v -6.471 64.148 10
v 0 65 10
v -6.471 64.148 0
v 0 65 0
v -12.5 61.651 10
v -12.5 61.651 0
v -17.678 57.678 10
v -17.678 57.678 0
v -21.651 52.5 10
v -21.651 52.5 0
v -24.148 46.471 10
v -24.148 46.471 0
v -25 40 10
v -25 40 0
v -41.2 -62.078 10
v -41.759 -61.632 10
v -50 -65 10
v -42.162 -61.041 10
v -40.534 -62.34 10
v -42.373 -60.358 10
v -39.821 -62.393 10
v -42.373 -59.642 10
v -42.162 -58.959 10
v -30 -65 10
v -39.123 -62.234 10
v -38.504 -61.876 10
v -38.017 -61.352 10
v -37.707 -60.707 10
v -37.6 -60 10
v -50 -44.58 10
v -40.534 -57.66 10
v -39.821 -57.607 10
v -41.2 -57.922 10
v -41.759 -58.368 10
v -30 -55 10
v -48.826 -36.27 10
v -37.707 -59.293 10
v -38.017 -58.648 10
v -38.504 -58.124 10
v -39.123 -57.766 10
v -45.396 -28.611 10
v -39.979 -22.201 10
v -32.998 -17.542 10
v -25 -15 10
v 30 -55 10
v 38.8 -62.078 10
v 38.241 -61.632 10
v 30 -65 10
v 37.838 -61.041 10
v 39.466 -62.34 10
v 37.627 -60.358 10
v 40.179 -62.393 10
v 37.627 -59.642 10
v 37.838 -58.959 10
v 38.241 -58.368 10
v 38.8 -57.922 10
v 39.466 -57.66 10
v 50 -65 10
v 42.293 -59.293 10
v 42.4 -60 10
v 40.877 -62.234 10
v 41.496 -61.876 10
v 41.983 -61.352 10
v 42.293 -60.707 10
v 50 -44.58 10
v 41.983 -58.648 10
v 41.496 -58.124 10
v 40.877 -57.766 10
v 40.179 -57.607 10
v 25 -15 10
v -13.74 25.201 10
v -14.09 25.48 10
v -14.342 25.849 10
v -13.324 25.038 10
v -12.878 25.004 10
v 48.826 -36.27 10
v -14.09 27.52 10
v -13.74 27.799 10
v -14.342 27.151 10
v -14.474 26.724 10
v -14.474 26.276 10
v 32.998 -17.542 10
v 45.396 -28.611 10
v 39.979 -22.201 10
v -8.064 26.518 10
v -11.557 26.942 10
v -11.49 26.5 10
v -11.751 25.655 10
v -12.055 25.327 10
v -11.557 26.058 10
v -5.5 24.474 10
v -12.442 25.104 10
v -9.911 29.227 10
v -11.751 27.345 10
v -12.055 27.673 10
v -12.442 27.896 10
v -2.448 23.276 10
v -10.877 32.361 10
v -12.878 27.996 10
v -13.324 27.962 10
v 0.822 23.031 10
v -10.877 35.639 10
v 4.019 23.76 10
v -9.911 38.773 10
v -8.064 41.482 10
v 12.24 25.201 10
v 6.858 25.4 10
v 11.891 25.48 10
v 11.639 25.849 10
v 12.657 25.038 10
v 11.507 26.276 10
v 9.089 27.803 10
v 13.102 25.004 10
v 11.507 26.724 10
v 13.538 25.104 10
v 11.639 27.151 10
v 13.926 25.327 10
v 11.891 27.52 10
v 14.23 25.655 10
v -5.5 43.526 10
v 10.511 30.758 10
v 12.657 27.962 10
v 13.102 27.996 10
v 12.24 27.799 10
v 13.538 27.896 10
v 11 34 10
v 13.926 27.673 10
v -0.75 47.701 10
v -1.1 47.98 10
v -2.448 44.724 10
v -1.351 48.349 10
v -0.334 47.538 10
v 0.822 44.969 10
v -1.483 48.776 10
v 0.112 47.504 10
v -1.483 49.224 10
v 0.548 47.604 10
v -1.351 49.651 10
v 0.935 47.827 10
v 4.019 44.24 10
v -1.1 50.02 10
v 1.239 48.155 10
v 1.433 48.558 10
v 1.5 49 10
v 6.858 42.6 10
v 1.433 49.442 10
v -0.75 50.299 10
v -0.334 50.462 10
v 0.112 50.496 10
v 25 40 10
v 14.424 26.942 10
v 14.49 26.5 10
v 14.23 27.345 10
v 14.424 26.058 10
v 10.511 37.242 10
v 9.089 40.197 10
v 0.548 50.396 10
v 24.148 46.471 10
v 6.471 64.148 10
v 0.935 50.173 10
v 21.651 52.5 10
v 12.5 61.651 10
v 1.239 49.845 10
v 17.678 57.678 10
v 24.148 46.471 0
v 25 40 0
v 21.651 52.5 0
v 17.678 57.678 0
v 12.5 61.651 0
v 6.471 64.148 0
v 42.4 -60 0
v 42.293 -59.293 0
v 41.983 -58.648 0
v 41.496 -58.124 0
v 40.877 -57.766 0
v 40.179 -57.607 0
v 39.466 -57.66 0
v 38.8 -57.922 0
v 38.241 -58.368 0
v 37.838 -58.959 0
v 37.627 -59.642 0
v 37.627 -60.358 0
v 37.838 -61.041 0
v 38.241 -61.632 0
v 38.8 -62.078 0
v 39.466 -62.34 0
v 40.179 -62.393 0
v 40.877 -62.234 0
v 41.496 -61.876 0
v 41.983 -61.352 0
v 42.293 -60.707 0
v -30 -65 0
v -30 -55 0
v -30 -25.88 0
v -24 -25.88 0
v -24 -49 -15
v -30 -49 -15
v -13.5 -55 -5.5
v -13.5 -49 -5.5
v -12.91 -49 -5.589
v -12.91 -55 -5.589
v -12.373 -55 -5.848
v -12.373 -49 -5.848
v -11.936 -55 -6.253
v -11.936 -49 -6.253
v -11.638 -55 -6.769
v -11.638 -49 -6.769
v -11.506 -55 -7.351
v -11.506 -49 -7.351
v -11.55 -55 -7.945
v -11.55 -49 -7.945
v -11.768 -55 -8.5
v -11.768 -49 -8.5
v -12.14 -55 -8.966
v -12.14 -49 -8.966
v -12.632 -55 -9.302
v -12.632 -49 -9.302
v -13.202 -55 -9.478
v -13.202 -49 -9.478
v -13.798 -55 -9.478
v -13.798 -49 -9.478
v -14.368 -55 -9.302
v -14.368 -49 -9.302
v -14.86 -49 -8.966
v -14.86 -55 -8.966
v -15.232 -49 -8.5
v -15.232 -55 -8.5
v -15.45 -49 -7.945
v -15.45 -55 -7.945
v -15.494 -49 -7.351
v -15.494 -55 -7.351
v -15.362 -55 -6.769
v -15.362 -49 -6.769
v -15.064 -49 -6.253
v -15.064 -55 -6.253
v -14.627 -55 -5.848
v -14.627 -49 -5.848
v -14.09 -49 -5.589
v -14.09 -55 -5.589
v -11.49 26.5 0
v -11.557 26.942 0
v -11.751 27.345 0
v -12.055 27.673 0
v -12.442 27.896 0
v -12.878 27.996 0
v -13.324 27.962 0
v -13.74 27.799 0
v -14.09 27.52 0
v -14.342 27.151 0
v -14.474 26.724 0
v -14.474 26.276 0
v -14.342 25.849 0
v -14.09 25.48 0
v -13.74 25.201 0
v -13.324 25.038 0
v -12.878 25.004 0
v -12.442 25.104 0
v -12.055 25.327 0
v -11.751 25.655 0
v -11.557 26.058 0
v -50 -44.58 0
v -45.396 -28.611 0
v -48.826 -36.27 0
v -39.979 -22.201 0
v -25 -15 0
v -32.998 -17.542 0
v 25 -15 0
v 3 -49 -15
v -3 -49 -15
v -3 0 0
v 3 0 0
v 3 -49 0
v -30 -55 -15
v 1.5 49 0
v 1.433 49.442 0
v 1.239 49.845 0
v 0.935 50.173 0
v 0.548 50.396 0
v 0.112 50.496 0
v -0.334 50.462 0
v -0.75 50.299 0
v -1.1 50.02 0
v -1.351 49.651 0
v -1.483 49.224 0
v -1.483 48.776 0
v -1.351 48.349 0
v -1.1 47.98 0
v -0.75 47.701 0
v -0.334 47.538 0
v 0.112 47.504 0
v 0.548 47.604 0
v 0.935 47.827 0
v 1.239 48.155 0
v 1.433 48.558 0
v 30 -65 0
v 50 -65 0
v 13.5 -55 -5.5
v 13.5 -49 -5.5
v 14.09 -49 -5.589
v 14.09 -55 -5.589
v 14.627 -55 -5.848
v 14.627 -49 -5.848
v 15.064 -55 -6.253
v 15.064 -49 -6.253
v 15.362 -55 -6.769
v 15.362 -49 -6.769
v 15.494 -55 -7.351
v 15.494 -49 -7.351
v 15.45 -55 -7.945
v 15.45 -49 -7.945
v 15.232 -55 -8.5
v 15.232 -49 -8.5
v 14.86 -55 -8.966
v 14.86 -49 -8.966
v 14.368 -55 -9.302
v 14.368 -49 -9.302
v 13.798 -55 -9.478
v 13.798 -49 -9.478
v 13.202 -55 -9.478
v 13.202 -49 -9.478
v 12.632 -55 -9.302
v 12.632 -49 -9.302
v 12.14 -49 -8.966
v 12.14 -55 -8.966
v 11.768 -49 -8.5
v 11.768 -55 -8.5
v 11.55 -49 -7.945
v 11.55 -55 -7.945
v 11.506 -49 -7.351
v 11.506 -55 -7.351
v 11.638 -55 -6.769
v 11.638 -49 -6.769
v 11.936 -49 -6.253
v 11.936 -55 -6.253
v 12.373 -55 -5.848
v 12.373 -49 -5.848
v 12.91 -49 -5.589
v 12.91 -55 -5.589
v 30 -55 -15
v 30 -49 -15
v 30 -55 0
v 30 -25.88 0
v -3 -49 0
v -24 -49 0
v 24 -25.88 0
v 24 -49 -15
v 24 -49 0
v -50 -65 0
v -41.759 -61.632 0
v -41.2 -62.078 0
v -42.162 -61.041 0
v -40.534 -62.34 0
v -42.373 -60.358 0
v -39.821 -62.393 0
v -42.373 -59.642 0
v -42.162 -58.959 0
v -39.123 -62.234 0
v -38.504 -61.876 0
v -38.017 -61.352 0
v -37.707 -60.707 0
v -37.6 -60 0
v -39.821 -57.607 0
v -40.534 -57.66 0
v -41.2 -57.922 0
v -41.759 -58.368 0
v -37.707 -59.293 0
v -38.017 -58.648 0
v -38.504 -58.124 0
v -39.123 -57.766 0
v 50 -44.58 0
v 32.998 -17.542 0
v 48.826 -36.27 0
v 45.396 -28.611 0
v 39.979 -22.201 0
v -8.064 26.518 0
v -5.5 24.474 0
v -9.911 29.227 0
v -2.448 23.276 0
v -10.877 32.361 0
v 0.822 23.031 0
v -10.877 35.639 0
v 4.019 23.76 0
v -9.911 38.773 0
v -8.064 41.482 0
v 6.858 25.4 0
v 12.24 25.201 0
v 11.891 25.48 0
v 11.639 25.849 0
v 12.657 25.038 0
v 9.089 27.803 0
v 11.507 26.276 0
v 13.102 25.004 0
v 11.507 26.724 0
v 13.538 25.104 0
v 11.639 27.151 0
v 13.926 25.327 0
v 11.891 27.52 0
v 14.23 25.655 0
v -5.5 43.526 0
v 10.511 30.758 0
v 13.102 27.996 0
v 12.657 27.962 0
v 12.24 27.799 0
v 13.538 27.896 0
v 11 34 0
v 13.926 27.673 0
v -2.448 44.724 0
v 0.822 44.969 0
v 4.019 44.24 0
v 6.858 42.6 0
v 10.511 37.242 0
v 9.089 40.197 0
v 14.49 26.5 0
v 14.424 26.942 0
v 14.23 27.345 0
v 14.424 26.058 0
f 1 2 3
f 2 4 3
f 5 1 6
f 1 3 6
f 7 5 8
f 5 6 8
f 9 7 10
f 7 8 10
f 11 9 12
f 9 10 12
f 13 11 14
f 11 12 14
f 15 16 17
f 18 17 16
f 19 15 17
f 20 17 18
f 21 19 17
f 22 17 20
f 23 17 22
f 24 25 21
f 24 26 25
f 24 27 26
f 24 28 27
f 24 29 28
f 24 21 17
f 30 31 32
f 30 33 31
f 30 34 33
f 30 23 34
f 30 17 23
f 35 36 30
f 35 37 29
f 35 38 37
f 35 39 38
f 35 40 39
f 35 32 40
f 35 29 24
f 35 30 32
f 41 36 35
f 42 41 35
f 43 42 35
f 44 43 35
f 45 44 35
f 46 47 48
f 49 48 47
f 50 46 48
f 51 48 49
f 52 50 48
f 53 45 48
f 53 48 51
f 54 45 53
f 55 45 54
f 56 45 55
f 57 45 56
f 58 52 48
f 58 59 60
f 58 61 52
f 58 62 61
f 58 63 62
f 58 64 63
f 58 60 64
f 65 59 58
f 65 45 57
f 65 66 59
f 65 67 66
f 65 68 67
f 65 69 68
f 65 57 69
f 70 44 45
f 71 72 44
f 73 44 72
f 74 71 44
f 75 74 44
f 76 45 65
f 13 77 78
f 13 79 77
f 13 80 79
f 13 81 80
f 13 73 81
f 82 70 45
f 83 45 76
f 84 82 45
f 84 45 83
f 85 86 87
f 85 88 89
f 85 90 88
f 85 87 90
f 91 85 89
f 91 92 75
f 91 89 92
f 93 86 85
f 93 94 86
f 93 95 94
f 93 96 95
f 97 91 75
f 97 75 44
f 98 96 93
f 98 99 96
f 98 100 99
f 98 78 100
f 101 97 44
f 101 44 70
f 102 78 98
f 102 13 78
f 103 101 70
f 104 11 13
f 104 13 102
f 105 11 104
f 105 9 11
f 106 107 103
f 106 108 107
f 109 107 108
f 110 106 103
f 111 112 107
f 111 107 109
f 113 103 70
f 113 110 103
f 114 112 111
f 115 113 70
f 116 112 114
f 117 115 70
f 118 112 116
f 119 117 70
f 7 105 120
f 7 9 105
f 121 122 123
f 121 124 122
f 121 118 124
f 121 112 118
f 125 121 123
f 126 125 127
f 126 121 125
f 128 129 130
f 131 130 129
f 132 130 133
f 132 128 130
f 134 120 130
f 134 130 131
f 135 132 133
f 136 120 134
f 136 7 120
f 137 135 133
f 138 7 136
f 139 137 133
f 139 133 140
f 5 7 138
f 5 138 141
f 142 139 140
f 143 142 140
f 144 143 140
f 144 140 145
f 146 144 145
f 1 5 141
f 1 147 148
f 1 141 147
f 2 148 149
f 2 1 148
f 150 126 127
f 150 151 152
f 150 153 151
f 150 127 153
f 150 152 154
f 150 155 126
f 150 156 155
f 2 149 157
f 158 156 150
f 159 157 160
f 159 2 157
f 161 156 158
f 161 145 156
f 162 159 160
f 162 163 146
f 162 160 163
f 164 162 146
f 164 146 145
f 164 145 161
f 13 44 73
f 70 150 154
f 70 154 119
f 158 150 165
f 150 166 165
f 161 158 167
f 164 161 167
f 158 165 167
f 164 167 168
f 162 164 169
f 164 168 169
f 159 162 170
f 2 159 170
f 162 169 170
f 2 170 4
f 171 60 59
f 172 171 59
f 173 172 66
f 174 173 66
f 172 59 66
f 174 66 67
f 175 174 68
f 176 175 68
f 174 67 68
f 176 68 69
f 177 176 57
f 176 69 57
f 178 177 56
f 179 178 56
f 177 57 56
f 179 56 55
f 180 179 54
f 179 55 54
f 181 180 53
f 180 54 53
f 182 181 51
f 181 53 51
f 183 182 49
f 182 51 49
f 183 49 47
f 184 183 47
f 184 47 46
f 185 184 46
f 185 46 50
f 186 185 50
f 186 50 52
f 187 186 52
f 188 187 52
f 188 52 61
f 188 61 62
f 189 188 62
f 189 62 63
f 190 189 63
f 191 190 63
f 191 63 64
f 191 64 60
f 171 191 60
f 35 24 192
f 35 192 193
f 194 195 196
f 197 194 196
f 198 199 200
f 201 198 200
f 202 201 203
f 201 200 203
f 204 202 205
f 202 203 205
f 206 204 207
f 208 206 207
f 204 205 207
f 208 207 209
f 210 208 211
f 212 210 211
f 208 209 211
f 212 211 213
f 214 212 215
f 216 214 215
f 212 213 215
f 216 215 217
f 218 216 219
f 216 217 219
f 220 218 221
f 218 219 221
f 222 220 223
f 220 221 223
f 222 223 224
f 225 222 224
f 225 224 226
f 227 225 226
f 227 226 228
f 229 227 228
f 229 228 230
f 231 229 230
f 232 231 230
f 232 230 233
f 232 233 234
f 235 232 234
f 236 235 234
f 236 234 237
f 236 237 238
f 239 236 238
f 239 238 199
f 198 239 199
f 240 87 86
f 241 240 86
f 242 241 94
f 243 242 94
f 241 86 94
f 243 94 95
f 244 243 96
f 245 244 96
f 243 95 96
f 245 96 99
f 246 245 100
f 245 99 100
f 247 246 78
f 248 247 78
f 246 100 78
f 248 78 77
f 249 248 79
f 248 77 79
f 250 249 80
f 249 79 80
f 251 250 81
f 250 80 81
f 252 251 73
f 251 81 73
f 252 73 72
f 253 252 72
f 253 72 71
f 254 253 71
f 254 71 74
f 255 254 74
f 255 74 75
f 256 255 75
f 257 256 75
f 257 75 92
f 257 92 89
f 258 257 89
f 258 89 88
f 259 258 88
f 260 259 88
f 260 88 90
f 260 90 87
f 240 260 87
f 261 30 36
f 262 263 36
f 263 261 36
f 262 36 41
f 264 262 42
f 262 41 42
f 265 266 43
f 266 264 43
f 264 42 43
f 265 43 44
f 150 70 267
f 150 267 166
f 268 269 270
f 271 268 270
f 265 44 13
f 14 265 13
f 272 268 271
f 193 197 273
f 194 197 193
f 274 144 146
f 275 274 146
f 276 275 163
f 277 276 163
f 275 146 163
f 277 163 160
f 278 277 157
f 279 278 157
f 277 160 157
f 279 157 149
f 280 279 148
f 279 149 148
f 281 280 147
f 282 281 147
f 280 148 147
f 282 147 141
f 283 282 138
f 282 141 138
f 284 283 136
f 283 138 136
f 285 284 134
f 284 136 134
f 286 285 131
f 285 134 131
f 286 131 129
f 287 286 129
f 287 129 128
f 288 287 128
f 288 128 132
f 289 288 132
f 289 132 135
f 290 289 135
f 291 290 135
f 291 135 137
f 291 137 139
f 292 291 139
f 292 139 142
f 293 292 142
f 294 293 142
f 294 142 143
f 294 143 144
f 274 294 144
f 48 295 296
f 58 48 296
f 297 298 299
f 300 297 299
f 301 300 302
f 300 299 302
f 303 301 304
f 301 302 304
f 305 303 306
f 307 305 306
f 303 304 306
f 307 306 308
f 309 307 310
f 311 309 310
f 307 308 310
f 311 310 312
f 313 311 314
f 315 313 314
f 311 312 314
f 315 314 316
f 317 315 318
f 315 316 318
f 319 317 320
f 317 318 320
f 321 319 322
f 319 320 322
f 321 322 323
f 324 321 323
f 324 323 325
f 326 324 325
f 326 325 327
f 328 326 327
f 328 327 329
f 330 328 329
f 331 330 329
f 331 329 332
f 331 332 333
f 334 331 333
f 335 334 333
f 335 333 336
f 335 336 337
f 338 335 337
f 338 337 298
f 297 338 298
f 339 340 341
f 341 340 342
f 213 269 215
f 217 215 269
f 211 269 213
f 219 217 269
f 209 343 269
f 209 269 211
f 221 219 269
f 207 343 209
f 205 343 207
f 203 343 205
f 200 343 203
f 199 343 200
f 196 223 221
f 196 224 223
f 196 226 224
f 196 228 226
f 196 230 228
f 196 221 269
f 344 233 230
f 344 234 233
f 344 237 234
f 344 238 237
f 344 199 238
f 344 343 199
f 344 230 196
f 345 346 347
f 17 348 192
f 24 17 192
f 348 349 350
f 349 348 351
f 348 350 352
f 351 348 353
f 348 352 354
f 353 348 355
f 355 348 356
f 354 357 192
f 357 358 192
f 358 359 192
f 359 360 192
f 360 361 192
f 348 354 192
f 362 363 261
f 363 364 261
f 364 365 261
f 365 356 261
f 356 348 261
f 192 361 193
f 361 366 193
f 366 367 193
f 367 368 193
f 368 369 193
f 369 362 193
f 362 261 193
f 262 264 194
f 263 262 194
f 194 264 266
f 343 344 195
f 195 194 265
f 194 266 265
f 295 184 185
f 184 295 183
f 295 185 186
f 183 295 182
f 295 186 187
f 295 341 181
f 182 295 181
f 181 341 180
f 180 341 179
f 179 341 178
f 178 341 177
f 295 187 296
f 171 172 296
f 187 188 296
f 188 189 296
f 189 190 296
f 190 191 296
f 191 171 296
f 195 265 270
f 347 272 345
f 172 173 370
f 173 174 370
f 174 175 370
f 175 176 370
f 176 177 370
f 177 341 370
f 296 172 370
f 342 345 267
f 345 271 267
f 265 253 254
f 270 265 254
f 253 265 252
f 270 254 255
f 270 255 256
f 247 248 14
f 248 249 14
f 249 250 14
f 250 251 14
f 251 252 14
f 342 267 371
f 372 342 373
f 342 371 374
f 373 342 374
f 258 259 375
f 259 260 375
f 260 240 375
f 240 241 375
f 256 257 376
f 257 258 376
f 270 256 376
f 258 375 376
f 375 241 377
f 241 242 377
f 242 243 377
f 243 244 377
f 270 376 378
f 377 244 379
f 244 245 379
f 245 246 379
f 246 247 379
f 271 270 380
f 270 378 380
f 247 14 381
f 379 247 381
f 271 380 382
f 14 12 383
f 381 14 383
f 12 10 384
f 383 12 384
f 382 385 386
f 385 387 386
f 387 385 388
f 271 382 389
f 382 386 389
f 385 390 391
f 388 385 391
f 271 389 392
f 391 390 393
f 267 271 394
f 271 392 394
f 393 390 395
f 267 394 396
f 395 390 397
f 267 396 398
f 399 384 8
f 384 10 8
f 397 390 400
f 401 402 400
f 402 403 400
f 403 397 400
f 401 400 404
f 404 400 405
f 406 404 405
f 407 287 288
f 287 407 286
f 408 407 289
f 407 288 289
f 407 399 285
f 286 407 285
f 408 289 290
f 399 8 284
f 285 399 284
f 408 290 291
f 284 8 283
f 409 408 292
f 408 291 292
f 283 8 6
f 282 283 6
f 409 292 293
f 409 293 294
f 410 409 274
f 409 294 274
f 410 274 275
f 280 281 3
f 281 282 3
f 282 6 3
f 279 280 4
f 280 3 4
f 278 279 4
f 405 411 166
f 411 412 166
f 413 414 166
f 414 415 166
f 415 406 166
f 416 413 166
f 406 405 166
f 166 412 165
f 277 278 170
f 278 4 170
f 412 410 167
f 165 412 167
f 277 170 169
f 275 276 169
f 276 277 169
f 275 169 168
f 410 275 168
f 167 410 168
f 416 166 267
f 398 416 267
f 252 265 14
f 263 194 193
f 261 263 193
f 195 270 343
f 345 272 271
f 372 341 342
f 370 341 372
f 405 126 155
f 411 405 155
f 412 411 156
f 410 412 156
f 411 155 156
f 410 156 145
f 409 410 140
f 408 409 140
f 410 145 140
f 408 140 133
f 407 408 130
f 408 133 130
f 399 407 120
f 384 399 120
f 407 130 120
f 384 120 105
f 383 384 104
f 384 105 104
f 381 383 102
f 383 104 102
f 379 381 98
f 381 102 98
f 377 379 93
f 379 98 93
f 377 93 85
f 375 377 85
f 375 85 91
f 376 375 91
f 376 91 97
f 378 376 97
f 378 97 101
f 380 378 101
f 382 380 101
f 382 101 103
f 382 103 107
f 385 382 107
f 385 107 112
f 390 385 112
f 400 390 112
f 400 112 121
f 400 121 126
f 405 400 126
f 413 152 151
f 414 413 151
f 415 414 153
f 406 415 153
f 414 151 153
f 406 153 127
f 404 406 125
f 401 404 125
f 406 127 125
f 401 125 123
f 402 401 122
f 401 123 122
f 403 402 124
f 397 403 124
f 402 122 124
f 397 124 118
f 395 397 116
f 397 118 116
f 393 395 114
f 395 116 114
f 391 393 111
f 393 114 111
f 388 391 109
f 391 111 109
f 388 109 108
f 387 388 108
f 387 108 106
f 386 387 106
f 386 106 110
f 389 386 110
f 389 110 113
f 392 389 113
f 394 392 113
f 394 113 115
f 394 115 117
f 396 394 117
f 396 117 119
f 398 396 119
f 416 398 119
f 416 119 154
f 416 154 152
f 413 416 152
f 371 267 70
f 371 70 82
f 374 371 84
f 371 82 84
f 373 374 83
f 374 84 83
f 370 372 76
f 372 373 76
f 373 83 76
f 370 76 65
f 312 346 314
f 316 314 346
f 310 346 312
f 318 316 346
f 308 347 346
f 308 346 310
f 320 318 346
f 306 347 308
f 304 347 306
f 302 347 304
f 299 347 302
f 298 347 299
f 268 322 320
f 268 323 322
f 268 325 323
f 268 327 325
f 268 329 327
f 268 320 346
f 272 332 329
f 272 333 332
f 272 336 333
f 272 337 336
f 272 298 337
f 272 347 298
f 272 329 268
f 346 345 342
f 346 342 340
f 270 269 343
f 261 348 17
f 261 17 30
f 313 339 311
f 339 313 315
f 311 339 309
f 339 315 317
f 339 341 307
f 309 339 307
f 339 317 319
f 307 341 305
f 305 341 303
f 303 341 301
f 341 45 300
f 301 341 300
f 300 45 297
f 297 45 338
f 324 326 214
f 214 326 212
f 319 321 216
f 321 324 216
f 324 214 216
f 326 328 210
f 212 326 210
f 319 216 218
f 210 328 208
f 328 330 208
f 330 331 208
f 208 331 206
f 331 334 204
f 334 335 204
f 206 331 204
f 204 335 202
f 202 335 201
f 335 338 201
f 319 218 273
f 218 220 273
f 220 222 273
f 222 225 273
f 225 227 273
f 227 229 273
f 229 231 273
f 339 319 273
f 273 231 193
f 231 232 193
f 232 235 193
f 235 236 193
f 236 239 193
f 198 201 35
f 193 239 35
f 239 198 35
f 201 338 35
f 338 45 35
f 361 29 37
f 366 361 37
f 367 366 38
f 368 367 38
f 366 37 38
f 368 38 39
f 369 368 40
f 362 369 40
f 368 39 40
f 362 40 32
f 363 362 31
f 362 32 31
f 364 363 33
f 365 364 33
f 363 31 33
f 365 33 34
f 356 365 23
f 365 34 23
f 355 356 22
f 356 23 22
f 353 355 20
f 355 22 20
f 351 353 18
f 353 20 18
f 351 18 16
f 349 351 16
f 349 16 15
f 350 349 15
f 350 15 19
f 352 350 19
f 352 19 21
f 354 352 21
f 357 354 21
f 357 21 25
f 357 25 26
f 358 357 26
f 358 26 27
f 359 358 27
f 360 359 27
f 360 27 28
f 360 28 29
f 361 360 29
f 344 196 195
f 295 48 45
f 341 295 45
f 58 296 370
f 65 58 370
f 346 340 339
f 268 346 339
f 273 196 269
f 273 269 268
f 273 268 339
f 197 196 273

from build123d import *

# Parameters (mm, degrees)
SKETCH2_W           = 100
SKETCH2_H           = 130
BOSS_EXTRUDE1_DEPTH = 10
SKETCH4_W           = 60
SKETCH4_H           = 10
SKETCH4_W_2         = 25
SKETCH4_H_2         = 80
CUT_EXTRUDE1_DEPTH  = 55
SKETCH6_W           = 60
SKETCH6_H           = 6
BOSS_EXTRUDE2_DEPTH = 15
SKETCH10_R          = 2.4
CUT_EXTRUDE3_DEPTH  = 15
FILLET6_R           = 30
FILLET7_R           = 30
RIB9_REACH          = 85.367
SKETCH12_WALL_W     = 219.977831906
SKETCH12_WALL_H     = 6
RIB10_START         = -6
RIB10_DEPTH         = 6
SKETCH14_R          = 2
CUT_EXTRUDE4_DEPTH  = 15
FILLET8_R           = 25
SKETCH15_R          = 11
CUT_EXTRUDE5_DEPTH  = 15
SKETCH17_R          = 1.5
CUT_EXTRUDE6_DEPTH  = 15


# Read off the part's stored shape, not the designer's step: Rib10
# Some blends are built 0.0001 mm under size
with BuildPart() as part:
    # Sketch2 → Boss-Extrude1 (new body)
    with BuildSketch(Plane.XY):
        Rectangle(SKETCH2_W, SKETCH2_H)
    extrude(amount=BOSS_EXTRUDE1_DEPTH)

    # Sketch4 → Cut-Extrude1 (cut)
    with BuildSketch(Plane.XY.offset(10)):
        with Locations((0, -60)):
            Rectangle(SKETCH4_W, SKETCH4_H)
        with Locations((-37.5, 25)):
            Rectangle(SKETCH4_W_2, SKETCH4_H_2)
        with Locations((37.5, 25)):
            Rectangle(SKETCH4_W_2, SKETCH4_H_2)
    extrude(amount=-CUT_EXTRUDE1_DEPTH, mode=Mode.SUBTRACT)

    # Sketch6 → Boss-Extrude2 (add)
    with BuildSketch(Plane(origin=(0, 0, 0), x_dir=(-1, 0, 0), z_dir=(0, 0, -1))):
        with Locations((0, -52)):
            Rectangle(SKETCH6_W, SKETCH6_H)
    extrude(amount=BOSS_EXTRUDE2_DEPTH)

    # Sketch10 → Cut-Extrude3 (cut)
    with BuildSketch(Plane.XY.offset(10)):
        with Locations((-40, -60)):
            Circle(SKETCH10_R)
        with Locations((40, -60)):
            Circle(SKETCH10_R)
    extrude(amount=-CUT_EXTRUDE3_DEPTH, mode=Mode.SUBTRACT)

    # Fillet6
    # the kernel refuses this fillet: 30 mm, written as the material it takes off along each edge
    with BuildSketch(Plane(origin=(50, -15, 83.950997289), x_dir=(-1, 0, 0), z_dir=(0, 0, -1))) as fillet6_piece_1:
        with BuildLine():
            CenterArc((30, -29.580398915), FILLET6_R, 99.594068227, 80.405931773)
            Line((0, -29.580398916), (-0.6, -29.580398916))
            Line((-0.6, -29.580398916), (-0.6, 0))
            Line((-0.6, 0), (0, 0.6))
            ThreePointArc((0, 0.6), (12.5, 0.6), (24.9, 0.591607978))
            Line((24.9, 0.591607978), (25, 0))
        make_face()
    extrude(amount=157.901994578, mode=Mode.SUBTRACT)

    # Fillet7
    # the kernel refuses this fillet: 30 mm, written as the material it takes off along each edge
    with BuildSketch(Plane(origin=(-50, -15, 83.950997289), x_dir=(0, -1, 0), z_dir=(0, 0, -1))) as fillet7_piece_1:
        with BuildLine():
            CenterArc((29.580398916, -30), FILLET7_R, 90, 80.405931773)
            Line((0, -25), (-0.591607978, -24.9))
            ThreePointArc((-0.591607978, -24.9), (-0.6, -12.5), (-0.6, 0))
            Line((-0.6, 0), (0, 0.6))
            Line((0, 0.6), (29.580398916, 0.6))
            Line((29.580398916, 0.6), (29.580398916, 0))
        make_face()
    extrude(amount=157.901994578, mode=Mode.SUBTRACT)

    # Sketch12 wall → Rib9 (add, up to next)
    with BuildSketch(Plane(origin=(0, -24.5, -7.5), x_dir=(0, 0.956199955507, 0.292714272094), z_dir=(0, -0.292714272094, 0.956199955507)), mode=Mode.PRIVATE) as rib9_sk1:
        Rectangle(SKETCH12_WALL_W, SKETCH12_WALL_H)
    rib9_tool1 = extrude(rib9_sk1.sketch, amount=RIB9_REACH, mode=Mode.PRIVATE) - part.part
    add(rib9_tool1.solids().sort_by_distance((0, -24.5, -7.5))[0])

    # Rib10 outline → Rib10 (add)
    with BuildSketch(Plane.ZY.offset(30).offset(RIB10_START)):
        Polygon((0, -25.879609738), (-15, -49), (0, -49), align=None)
    rib10 = extrude(amount=RIB10_DEPTH)

    # Mirror4: Rib10 across plane
    add(rib10.mirror(Plane(origin=(0, 0, 0), x_dir=(0, 0, 1), z_dir=(1, 0, 0))))

    # Sketch14 → Cut-Extrude4 (cut)
    with BuildSketch(Plane(origin=(0, -49, 0), x_dir=(1, 0, 0), z_dir=(0, 1, 0))):
        with Locations(Location((-13.5, 7.5, 0), (0, 0, 270))):
            Circle(SKETCH14_R)
        with Locations(Location((13.5, 7.5, 0), (0, 0, 270))):
            Circle(SKETCH14_R)
    extrude(amount=-CUT_EXTRUDE4_DEPTH, mode=Mode.SUBTRACT)

    # Fillet8
    fillet8_edges = [part.edges().sort_by_distance(p)[0] for p in [
        (25, 65, 5),
        (-25, 65, 5),
    ]]
    fillet(fillet8_edges, radius=FILLET8_R - 0.0001)  # a hair under: the kernel refuses the full size

    # Sketch15 → Cut-Extrude5 (cut)
    with BuildSketch(Plane.XY.offset(10)):
        with Locations((0, 34)):
            Circle(SKETCH15_R)
    extrude(amount=-CUT_EXTRUDE5_DEPTH, mode=Mode.SUBTRACT)

    # Sketch17 → Cut-Extrude6 (cut)
    with BuildSketch(Plane.XY.offset(10)):
        with Locations((0, 49)):
            Circle(SKETCH17_R)
        with Locations((12.990381057, 26.5)):
            Circle(SKETCH17_R)
        with Locations((-12.990381057, 26.5)):
            Circle(SKETCH17_R)
    extrude(amount=-CUT_EXTRUDE6_DEPTH, mode=Mode.SUBTRACT)


solid = part.part
